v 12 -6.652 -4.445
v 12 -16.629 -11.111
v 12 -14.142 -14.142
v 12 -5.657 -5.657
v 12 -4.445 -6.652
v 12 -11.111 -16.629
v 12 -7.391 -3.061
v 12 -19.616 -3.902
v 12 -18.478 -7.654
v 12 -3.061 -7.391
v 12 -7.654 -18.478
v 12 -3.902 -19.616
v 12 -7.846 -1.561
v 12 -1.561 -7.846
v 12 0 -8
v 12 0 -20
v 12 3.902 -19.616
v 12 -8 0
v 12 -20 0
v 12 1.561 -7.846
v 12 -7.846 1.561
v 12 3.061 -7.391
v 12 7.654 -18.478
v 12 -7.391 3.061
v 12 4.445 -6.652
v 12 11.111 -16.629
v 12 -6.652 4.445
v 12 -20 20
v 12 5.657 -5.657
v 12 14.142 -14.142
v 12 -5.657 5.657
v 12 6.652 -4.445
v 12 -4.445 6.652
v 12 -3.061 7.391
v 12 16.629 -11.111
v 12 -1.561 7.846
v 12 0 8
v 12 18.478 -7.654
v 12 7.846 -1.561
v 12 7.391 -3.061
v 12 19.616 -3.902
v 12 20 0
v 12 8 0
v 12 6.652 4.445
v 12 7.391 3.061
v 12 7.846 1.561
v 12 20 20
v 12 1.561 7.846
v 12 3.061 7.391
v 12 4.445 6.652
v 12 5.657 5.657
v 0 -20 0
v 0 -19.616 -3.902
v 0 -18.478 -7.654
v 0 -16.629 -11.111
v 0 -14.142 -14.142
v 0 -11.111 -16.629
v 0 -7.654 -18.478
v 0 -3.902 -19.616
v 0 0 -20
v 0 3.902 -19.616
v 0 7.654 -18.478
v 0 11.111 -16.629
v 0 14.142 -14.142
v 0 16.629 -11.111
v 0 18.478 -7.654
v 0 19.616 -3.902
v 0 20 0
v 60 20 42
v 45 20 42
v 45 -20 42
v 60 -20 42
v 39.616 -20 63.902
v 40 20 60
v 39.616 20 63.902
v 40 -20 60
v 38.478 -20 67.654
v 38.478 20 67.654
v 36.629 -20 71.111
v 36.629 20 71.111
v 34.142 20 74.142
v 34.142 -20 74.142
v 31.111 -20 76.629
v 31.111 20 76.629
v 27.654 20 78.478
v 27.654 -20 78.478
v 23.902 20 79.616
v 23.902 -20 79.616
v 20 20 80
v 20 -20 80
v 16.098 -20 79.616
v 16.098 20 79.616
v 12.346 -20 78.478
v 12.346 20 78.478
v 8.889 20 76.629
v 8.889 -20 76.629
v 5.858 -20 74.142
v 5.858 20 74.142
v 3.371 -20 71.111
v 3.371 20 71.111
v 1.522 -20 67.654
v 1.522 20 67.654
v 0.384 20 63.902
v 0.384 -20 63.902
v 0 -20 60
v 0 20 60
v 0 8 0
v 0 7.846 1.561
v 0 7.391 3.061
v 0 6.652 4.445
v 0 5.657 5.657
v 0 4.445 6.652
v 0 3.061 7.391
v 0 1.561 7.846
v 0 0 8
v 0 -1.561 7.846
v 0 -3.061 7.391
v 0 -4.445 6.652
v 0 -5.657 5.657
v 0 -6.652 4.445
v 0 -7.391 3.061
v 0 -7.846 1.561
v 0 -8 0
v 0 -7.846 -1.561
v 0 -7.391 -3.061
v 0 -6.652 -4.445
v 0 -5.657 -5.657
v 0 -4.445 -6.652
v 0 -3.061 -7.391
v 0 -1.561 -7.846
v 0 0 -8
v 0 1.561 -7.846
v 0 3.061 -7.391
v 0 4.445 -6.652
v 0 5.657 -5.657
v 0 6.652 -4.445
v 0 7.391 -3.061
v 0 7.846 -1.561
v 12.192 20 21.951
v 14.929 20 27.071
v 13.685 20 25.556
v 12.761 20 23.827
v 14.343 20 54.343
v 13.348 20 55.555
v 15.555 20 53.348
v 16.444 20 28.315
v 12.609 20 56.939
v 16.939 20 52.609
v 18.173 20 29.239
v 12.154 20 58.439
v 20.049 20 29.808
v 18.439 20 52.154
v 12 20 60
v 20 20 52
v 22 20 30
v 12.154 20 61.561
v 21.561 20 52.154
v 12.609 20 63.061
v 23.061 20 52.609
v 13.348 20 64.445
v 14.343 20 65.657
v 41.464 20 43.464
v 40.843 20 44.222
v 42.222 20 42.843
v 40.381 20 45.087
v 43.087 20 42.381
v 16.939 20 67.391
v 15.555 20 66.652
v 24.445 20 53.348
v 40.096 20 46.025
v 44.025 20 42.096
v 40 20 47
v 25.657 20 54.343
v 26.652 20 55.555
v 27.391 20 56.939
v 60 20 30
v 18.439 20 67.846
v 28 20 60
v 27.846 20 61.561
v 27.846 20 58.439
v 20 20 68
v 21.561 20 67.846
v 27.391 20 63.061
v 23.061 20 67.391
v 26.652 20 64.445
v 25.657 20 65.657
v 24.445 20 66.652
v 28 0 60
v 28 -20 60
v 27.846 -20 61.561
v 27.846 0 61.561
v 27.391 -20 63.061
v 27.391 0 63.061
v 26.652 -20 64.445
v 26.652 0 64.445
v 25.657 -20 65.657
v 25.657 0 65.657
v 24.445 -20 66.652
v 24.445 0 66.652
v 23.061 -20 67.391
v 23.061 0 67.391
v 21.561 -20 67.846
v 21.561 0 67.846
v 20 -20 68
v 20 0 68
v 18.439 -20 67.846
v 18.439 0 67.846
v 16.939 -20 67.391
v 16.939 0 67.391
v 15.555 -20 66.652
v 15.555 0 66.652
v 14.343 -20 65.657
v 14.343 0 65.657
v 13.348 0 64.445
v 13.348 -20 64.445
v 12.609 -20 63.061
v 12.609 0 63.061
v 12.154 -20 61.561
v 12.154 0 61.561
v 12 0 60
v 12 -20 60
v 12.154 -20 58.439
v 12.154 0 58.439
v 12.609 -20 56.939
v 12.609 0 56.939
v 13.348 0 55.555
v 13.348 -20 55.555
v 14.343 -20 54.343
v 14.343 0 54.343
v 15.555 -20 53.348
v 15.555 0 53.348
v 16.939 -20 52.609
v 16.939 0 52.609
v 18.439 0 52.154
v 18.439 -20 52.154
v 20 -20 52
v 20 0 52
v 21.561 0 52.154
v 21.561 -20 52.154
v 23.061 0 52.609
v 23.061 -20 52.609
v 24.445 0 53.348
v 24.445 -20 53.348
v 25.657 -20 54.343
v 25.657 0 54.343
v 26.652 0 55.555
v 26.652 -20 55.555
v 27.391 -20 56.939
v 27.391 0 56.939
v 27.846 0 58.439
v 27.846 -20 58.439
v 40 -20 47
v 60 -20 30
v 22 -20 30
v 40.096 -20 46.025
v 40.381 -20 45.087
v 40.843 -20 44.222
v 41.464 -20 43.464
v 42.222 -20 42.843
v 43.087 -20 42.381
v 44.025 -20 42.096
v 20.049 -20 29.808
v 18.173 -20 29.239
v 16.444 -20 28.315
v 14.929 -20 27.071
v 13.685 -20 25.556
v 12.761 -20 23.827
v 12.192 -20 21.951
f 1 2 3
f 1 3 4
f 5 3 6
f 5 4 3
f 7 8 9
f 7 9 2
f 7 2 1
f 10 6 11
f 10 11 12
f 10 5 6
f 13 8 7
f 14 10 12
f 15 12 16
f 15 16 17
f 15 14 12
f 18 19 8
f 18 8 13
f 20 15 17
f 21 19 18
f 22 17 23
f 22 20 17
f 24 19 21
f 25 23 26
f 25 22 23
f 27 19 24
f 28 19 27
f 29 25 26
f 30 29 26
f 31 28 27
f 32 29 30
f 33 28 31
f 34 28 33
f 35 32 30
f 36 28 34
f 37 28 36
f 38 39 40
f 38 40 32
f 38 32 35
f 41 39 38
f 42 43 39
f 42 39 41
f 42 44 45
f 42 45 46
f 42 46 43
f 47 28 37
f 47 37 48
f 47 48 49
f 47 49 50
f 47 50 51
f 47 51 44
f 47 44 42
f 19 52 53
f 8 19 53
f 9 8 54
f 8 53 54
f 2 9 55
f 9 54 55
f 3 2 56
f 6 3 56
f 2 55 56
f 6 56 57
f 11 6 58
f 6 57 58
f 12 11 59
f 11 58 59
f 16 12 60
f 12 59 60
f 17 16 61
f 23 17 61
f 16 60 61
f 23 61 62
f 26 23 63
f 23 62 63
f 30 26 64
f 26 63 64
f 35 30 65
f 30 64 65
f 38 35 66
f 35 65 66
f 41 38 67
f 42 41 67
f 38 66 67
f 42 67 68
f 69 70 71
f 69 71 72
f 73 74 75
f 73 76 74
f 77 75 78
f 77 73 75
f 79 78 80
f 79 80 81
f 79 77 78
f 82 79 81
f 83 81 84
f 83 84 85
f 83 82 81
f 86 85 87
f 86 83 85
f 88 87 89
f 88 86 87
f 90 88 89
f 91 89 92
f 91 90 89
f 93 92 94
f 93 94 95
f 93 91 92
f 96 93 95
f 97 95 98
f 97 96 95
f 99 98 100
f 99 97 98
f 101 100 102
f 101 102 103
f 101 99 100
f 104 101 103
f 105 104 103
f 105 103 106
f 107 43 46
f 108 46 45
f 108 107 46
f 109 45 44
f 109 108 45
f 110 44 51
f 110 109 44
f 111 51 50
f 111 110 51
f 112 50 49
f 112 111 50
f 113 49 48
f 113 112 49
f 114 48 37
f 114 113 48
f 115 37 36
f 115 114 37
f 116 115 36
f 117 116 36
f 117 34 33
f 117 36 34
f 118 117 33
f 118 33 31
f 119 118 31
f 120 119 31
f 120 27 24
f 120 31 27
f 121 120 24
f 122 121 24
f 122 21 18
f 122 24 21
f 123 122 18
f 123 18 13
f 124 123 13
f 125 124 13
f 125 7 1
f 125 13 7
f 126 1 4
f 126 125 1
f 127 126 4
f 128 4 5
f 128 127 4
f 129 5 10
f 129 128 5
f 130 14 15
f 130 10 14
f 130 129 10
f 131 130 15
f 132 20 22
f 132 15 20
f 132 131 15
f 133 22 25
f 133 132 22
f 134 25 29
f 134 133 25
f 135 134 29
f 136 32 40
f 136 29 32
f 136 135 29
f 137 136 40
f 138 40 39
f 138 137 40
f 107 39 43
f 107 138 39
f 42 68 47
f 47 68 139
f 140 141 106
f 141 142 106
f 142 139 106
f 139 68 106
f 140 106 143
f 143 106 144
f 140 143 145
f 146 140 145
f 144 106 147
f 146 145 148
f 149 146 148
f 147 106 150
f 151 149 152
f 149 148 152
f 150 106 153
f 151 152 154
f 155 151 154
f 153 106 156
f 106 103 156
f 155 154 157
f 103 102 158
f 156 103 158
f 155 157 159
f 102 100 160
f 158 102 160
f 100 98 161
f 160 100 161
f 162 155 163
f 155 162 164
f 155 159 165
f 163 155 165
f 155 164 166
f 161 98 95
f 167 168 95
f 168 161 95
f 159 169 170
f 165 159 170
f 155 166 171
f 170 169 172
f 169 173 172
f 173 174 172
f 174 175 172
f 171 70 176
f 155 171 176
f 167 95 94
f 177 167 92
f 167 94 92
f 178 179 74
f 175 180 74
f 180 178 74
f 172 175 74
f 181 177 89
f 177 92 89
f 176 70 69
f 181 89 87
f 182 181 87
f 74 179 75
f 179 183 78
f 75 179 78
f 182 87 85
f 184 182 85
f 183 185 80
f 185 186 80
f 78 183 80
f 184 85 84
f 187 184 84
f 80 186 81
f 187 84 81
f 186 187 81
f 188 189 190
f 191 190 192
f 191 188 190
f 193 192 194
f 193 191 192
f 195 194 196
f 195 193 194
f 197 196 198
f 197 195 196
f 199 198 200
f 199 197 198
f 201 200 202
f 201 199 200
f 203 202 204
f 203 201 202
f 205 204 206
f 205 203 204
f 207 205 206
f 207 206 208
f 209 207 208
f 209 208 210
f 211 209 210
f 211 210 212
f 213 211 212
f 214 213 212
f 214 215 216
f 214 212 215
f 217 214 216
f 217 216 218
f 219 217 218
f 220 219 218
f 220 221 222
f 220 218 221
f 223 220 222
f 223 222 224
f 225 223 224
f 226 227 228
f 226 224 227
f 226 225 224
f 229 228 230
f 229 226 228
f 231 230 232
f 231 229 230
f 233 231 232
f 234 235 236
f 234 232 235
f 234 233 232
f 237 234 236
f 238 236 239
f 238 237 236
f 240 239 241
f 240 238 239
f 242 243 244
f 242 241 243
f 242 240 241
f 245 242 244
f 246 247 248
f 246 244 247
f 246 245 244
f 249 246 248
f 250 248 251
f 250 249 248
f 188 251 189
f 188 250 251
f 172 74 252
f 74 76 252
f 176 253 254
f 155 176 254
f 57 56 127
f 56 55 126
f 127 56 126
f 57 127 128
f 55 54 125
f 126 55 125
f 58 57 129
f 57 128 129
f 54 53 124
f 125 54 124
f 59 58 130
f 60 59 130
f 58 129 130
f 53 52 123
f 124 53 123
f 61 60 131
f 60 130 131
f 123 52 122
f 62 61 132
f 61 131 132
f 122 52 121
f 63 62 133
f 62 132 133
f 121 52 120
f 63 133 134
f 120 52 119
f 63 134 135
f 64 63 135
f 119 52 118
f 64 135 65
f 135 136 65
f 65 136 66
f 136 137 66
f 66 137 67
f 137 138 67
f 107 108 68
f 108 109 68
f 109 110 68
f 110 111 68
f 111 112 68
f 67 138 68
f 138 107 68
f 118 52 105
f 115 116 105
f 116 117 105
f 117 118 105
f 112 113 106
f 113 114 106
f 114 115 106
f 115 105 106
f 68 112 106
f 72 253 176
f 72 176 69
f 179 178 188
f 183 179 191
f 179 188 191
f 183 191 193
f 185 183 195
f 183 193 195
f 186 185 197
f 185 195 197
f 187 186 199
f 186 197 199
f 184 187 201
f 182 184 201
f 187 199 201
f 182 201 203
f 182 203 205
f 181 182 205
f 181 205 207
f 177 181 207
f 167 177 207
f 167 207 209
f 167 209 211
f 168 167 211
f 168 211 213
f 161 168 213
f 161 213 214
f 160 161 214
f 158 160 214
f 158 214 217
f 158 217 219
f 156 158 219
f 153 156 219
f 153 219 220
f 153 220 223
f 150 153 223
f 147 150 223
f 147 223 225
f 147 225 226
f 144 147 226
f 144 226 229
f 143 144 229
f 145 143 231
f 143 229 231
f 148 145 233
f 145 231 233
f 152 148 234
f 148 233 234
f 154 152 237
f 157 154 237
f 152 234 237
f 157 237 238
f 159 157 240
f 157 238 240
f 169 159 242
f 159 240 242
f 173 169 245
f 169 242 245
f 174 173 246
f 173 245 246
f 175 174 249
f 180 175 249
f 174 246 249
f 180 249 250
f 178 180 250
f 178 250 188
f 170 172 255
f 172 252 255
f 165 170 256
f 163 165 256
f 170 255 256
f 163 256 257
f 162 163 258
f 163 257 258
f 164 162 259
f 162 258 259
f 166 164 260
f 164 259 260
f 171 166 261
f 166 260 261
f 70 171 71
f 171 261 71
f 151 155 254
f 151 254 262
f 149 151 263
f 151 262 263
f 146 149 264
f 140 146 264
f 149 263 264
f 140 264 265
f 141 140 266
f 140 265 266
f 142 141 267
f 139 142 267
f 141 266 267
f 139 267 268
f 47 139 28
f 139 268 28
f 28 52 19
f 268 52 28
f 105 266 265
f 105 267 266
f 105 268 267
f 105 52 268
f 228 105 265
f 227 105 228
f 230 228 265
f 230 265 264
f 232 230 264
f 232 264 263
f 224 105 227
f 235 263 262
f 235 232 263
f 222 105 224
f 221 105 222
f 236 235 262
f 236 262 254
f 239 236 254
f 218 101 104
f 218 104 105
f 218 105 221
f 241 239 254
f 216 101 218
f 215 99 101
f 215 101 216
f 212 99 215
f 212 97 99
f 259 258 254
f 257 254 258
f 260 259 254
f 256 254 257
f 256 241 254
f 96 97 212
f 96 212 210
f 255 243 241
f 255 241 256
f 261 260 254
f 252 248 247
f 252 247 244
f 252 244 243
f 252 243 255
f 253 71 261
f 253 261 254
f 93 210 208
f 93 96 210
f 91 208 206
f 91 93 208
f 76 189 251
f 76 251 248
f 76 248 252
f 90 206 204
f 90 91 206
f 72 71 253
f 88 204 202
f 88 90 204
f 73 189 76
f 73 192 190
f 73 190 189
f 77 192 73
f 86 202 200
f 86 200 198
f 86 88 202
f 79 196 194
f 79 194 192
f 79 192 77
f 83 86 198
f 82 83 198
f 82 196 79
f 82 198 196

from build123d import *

# Parameters (mm, degrees)
PAD_DEPTH            = 20
PAD001_DEPTH         = 20
PAD002_DEPTH         = 12
SKETCH004_R          = 8
POCKET001_DEPTH      = 20.001
POCKET001_DEPTH_BACK = -20.001
SKETCH005_R          = 8
POCKET002_DEPTH      = 0.001
POCKET002_DEPTH_BACK = -60.001


with BuildPart() as part:
    # Sketch → Pad (new body, symmetric)
    with BuildSketch(Plane.XZ):
        with BuildLine():
            Line((0, 60), (0, 0))
            Line((0, 0), (12, 0))
            Line((12, 0), (12, 20))
            ThreePointArc((22, 30), (14.928932, 27.071068), (12, 20))
            Line((60, 30), (22, 30))
            Line((60, 30), (60, 42))
            Line((45, 42), (60, 42))
            ThreePointArc((40, 47), (41.464466, 43.464466), (45, 42))
            Line((40, 60), (40, 47))
            Line((40, 60), (0, 60))
        make_face()
    extrude(amount=PAD_DEPTH, both=True)

    # Sketch001 → Pad001 (join, symmetric)
    with BuildSketch(Plane.XZ):
        with BuildLine():
            ThreePointArc((40, 60), (20, 80), (0, 60))
            Line((40, 60), (0, 60))
        make_face()
    extrude(amount=PAD001_DEPTH, both=True)

    # Sketch002 → Pad002 (join)
    with BuildSketch(Plane.YZ):
        with BuildLine():
            ThreePointArc((-20, 0), (0, -20), (20, 0))
            Line((20, 0), (-20, 0))
        make_face()
    extrude(amount=PAD002_DEPTH)

    # Sketch004 → Pocket001 (cut, two sides)
    with BuildSketch(Plane.XZ) as pocket001_sk:
        with Locations((20, 60)):
            Circle(SKETCH004_R)
    extrude(amount=-POCKET001_DEPTH, mode=Mode.SUBTRACT)
    extrude(pocket001_sk.sketch, amount=-POCKET001_DEPTH_BACK, mode=Mode.SUBTRACT)

    # Sketch005 → Pocket002 (cut, two sides)
    with BuildSketch(Plane.YZ) as pocket002_sk:
        Circle(SKETCH005_R)
    extrude(amount=-POCKET002_DEPTH, mode=Mode.SUBTRACT)
    extrude(pocket002_sk.sketch, amount=-POCKET002_DEPTH_BACK, mode=Mode.SUBTRACT)


solid = part.part
